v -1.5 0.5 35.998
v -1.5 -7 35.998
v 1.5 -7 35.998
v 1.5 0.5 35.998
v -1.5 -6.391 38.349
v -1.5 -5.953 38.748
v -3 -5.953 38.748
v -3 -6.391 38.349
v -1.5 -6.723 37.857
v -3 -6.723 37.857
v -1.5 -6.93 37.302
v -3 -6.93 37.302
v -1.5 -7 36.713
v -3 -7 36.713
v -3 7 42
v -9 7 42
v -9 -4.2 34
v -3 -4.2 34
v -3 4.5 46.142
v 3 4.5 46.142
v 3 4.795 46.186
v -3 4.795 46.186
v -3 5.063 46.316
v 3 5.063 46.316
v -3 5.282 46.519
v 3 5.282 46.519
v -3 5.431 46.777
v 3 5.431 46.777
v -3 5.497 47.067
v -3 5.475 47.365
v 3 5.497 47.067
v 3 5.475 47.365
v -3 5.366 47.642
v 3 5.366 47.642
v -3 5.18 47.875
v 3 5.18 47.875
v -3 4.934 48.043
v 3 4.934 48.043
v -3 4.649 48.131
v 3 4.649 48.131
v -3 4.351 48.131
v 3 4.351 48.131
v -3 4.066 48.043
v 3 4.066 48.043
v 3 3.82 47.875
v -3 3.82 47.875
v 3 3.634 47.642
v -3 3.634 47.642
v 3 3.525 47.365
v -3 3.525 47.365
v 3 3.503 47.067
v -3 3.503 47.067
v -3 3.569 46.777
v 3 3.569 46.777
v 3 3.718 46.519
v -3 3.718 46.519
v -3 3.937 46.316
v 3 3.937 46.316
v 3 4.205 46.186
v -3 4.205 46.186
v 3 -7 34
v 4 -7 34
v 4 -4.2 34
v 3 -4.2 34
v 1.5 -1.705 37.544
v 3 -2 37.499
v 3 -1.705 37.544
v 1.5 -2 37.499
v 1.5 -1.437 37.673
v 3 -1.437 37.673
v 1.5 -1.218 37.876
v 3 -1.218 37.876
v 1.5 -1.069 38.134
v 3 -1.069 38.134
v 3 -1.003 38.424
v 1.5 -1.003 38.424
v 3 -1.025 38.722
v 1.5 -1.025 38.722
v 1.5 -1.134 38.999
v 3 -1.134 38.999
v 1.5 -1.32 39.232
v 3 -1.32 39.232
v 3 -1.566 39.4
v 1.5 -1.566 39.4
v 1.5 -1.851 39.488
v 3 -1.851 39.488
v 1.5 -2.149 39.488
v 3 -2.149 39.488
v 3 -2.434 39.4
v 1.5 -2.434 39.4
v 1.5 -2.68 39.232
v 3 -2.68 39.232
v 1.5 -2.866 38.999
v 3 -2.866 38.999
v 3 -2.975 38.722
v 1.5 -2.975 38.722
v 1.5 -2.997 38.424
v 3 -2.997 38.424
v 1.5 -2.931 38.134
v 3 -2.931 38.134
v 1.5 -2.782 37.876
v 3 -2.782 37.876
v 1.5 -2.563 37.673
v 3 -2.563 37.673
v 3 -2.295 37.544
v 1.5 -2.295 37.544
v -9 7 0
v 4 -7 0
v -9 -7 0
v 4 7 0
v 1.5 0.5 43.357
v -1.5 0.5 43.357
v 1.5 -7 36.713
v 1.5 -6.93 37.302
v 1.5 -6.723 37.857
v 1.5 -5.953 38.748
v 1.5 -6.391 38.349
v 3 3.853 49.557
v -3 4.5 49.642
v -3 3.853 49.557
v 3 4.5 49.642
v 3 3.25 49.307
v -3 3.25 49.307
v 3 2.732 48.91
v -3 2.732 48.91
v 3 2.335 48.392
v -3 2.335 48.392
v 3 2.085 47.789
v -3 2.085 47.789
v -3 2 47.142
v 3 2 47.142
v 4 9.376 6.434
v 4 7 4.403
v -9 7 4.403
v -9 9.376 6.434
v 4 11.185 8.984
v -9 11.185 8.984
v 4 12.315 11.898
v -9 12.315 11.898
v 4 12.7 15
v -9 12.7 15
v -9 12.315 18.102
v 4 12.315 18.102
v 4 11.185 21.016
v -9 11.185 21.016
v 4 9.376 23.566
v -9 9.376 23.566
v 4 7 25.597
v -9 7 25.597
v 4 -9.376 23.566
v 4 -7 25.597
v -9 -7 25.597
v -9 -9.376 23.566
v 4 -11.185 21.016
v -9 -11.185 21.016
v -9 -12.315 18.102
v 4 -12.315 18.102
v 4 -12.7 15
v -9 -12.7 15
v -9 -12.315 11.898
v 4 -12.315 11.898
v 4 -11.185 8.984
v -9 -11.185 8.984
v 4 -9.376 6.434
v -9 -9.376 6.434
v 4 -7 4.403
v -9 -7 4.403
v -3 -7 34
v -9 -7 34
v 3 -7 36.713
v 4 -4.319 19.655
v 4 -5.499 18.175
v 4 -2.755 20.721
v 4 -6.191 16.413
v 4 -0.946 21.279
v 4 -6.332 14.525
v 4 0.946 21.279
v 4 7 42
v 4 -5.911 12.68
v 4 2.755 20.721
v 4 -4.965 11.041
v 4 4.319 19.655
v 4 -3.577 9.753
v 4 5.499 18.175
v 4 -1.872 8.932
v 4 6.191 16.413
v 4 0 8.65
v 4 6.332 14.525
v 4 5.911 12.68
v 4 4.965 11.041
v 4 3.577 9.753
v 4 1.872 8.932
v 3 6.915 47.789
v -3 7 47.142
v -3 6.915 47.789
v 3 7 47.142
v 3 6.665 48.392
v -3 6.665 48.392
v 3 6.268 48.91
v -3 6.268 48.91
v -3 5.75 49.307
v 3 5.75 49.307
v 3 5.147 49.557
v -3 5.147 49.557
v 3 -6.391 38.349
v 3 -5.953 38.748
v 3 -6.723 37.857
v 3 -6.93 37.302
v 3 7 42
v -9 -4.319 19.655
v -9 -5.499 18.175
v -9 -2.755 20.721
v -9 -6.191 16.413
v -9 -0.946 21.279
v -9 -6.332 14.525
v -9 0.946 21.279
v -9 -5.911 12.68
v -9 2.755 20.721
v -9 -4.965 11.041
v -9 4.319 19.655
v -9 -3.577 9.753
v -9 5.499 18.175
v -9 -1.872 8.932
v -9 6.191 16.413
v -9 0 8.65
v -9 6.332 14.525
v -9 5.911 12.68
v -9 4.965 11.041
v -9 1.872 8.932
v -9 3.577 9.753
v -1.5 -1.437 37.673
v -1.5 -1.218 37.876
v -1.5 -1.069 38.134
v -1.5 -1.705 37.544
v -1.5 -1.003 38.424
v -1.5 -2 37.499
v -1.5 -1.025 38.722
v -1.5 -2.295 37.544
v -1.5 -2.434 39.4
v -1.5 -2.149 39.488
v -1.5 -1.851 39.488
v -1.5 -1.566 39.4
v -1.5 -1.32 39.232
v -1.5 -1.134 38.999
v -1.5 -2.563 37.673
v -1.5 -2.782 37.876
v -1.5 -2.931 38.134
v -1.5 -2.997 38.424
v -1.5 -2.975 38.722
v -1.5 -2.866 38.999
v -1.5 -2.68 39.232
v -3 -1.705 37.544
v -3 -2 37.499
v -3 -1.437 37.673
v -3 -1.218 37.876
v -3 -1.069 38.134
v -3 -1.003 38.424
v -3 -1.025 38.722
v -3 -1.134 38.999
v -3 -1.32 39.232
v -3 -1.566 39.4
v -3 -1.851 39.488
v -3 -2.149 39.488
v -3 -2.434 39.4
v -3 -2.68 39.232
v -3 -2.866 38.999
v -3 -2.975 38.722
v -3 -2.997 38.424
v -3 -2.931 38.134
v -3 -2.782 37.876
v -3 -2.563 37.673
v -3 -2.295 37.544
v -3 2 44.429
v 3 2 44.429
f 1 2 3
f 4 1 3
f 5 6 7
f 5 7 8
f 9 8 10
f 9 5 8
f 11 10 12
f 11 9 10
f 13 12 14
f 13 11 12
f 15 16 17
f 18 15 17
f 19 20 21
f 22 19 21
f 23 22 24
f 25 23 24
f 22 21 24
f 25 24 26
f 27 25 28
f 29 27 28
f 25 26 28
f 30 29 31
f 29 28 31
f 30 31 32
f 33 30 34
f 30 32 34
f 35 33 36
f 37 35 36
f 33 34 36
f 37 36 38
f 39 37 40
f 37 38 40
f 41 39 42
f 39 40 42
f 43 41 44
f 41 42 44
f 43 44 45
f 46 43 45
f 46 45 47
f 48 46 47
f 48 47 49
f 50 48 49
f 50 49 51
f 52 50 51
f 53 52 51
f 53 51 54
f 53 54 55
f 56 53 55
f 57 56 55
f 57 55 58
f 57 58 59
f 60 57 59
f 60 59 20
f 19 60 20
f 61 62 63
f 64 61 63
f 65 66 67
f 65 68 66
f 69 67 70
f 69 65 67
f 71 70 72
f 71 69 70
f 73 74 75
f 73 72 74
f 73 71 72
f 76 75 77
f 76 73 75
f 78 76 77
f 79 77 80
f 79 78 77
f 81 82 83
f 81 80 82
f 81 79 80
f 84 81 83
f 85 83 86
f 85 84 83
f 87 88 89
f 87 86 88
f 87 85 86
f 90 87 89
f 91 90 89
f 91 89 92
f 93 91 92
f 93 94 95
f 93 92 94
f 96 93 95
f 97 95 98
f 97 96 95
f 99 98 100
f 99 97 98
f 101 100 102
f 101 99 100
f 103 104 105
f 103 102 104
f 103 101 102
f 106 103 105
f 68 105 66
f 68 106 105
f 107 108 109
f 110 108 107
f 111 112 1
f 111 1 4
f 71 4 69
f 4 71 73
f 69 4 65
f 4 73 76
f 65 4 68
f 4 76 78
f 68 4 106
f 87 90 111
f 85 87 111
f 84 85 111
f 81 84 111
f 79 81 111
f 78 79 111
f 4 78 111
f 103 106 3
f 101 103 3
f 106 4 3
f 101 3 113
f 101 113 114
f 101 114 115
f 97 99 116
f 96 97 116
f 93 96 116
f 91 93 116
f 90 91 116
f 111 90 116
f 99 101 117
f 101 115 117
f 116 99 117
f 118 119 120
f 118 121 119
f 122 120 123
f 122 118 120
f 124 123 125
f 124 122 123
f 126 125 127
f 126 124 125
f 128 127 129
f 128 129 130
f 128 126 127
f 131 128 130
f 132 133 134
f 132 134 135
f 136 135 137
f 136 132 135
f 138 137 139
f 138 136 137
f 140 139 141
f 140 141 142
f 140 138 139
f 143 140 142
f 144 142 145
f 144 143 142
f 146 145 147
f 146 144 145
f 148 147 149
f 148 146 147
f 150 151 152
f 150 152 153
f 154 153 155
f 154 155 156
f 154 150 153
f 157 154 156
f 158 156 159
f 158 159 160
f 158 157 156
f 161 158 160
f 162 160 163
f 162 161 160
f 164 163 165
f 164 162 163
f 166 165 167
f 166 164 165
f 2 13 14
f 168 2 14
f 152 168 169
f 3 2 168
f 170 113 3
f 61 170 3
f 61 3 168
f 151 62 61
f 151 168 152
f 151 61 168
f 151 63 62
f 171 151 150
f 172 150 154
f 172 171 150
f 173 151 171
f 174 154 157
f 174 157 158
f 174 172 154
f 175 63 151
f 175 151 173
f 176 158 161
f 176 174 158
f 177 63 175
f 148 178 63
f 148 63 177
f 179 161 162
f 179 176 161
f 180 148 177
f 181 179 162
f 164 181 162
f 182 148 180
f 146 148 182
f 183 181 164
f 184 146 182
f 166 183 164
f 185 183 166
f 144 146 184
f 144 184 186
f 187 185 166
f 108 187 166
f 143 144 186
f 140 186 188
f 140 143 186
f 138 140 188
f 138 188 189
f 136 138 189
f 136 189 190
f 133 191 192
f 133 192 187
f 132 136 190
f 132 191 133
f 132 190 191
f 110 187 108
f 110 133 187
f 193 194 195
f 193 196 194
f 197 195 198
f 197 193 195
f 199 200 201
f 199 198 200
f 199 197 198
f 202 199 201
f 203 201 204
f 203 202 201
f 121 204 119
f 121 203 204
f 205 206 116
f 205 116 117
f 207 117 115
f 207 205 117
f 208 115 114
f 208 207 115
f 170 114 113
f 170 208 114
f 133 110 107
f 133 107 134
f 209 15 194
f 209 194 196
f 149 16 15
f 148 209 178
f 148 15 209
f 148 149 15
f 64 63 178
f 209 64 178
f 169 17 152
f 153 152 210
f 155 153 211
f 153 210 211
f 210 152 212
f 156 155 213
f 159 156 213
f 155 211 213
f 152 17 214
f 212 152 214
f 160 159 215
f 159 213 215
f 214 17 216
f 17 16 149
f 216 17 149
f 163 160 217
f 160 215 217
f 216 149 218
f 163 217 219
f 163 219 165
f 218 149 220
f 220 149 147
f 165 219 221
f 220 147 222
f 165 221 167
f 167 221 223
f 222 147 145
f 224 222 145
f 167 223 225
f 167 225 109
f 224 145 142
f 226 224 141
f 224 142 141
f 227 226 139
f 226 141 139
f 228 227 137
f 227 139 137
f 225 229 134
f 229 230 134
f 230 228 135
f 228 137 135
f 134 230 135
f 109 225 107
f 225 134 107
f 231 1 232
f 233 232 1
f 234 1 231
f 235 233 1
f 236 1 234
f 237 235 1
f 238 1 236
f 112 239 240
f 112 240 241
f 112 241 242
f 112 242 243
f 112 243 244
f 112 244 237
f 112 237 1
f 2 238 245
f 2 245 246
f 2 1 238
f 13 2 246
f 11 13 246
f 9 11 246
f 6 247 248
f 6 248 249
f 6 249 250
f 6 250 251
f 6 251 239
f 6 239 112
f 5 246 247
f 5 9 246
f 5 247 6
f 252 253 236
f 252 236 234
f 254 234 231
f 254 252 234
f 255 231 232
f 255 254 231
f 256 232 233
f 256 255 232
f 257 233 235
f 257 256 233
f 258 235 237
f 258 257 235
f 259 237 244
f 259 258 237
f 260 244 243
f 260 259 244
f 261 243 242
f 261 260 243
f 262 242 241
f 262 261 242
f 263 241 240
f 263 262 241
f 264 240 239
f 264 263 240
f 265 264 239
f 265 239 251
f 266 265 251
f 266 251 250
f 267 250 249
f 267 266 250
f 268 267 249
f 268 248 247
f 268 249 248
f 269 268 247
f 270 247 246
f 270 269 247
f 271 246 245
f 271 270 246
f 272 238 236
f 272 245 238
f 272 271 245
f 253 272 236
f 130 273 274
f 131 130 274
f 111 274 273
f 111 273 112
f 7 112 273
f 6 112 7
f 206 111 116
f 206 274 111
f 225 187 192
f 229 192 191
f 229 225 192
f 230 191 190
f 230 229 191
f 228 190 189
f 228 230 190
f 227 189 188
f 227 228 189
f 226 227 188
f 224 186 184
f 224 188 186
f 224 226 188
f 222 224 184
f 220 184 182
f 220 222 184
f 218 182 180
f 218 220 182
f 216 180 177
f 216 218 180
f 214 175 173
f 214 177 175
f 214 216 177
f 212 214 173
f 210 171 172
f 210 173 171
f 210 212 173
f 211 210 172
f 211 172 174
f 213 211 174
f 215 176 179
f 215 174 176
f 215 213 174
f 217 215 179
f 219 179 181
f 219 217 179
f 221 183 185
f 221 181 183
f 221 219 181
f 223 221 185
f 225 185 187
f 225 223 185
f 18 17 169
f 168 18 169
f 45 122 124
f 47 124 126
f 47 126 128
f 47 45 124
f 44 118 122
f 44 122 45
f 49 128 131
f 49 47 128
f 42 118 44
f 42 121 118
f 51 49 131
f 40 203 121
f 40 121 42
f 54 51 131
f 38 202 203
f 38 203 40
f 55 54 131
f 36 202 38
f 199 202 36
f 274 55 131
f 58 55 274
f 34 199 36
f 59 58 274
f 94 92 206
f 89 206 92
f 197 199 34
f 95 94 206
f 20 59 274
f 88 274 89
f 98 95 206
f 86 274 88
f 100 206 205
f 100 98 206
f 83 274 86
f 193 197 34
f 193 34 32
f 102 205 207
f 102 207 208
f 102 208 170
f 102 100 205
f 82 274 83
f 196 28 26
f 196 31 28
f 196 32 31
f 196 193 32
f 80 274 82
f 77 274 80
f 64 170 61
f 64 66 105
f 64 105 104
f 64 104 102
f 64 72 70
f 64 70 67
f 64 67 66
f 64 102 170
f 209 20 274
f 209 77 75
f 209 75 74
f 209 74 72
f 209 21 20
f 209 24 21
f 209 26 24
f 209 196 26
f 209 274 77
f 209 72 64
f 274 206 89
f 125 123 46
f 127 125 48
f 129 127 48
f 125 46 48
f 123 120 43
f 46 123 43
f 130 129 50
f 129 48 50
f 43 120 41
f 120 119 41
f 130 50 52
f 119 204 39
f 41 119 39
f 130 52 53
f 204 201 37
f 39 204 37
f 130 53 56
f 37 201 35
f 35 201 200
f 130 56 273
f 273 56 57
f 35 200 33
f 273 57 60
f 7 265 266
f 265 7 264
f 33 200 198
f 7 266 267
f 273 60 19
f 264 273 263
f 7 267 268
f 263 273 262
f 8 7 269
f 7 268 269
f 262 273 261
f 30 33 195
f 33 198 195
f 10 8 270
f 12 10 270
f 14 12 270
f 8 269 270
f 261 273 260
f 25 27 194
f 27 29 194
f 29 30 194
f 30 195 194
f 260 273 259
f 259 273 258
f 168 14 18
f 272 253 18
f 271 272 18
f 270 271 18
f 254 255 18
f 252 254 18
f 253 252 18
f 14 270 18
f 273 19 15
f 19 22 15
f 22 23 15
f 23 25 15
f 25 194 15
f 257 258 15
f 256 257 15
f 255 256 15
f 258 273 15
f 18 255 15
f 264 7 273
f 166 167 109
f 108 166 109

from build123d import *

# Parameters (mm, degrees)
SKETCH1_R           = 1
SKETCH1_R_2         = 6.35
BOSS_EXTRUDE1_DEPTH = 9
SKETCH2_W           = 6
SKETCH2_H           = 6.5
BOSS_EXTRUDE2_DEPTH = 5
CUT_EXTRUDE1_REACH  = 54.627
SKETCH3_R           = 1
FILLET1_R           = 2.5
SKETCH4_W           = 3
SKETCH4_H           = 8
CUT_EXTRUDE3_DEPTH  = 7.5
CUT_EXTRUDE8_DEPTH  = 6
CUT_EXTRUDE9_DEPTH  = 6
SKETCH9_W           = 49.64202669
SKETCH9_H           = 25.4
CUT_EXTRUDE11_DEPTH = 5


with BuildPart() as part:
    # Sketch1 → Boss-Extrude1 (new, symmetric)
    with BuildSketch(Plane(origin=(0, 0, 0), x_dir=(0, 0, -1), z_dir=(1, 0, 0))):
        with BuildLine():
            Line((-45.176360368, 3.046904516), (-38.74778894, -5.953095484))
            ThreePointArc((-38.74778894, -5.953095484), (-37.857409214, -6.722919107), (-36.713455262, -7))
            Line((-36.713455262, -7), (-25.596697599, -7))
            ThreePointArc((-25.596697599, -7), (-15, -12.7), (-4.403302401, -7))
            Line((-4.403302401, -7), (0, -7))
            Line((0, -7), (0, 7))
            Line((0, 7), (-4.403302401, 7))
            ThreePointArc((-4.403302401, 7), (-15, 12.7), (-25.596697599, 7))
            Line((-25.596697599, 7), (-43.14202669, 7))
            ThreePointArc((-43.14202669, 7), (-45.364945797, 5.643953952), (-45.176360368, 3.046904516))
        make_face()
        with Locations((-38.499169547, -2)):
            Circle(SKETCH1_R, mode=Mode.SUBTRACT)
        with Locations((-15, 0)):
            Circle(SKETCH1_R_2, mode=Mode.SUBTRACT)
    extrude(amount=BOSS_EXTRUDE1_DEPTH, both=True)

    # Sketch2 → Boss-Extrude2 (add)
    with BuildSketch(Plane(origin=(0, 7, 0), x_dir=(1, 0, 0), z_dir=(0, 1, 0))):
        with Locations((0, -46.39202669)):
            Rectangle(SKETCH2_W, SKETCH2_H)
    extrude(amount=-BOSS_EXTRUDE2_DEPTH)

    # Sketch3 → Cut-Extrude1 (cut, up to next)
    with BuildSketch(Plane(origin=(3, 0, 0), x_dir=(0, 0, -1), z_dir=(1, 0, 0)), mode=Mode.PRIVATE) as cut_extrude1_sk1:
        with Locations((-47.14202669, 4.5)):
            Circle(SKETCH3_R)
    cut_extrude1_tool1 = extrude(cut_extrude1_sk1.sketch, amount=-CUT_EXTRUDE1_REACH, mode=Mode.PRIVATE) & part.part
    add(cut_extrude1_tool1.solids().sort_by_distance((3, 4.5, 47.142027))[0], mode=Mode.SUBTRACT)

    # Fillet1
    fillet1_edges = [part.edges().sort_by_distance(p)[0] for p in [
        (0, 2, 49.64202669),
        (0, 7, 49.64202669),
    ]]
    fillet(fillet1_edges, radius=FILLET1_R - 0.0001)  # a hair under: the kernel refuses the full size

    # Sketch4 → Cut-Extrude3 (cut)
    with BuildSketch(Plane.XZ.offset(7)):
        with Locations((0, 39.99778894)):
            Rectangle(SKETCH4_W, SKETCH4_H)
    extrude(amount=-CUT_EXTRUDE3_DEPTH, mode=Mode.SUBTRACT)

    # Sketch6 → Cut-Extrude8 (cut)
    with BuildSketch(Plane(origin=(9, 0, 0), x_dir=(0, 0, -1), z_dir=(1, 0, 0))):
        Polygon((-48, 7), (-38, -7), (-34, -7), (-34, -4.2), (-42, 7), align=None)
    extrude(amount=-CUT_EXTRUDE8_DEPTH, mode=Mode.SUBTRACT)

    # Sketch8 → Cut-Extrude9 (cut)
    with BuildSketch(Plane.ZY.offset(9)):
        Polygon((38, -7), (48, 7), (42, 7), (34, -4.2), (34, -7), align=None)
    extrude(amount=-CUT_EXTRUDE9_DEPTH, mode=Mode.SUBTRACT)

    # Sketch9 → Cut-Extrude11 (cut)
    with BuildSketch(Plane(origin=(9, 0, 0), x_dir=(0, 0, -1), z_dir=(1, 0, 0))):
        with Locations((-24.821013345, 0)):
            Rectangle(SKETCH9_W, SKETCH9_H)
    extrude(amount=-CUT_EXTRUDE11_DEPTH, mode=Mode.SUBTRACT)


solid = part.part
